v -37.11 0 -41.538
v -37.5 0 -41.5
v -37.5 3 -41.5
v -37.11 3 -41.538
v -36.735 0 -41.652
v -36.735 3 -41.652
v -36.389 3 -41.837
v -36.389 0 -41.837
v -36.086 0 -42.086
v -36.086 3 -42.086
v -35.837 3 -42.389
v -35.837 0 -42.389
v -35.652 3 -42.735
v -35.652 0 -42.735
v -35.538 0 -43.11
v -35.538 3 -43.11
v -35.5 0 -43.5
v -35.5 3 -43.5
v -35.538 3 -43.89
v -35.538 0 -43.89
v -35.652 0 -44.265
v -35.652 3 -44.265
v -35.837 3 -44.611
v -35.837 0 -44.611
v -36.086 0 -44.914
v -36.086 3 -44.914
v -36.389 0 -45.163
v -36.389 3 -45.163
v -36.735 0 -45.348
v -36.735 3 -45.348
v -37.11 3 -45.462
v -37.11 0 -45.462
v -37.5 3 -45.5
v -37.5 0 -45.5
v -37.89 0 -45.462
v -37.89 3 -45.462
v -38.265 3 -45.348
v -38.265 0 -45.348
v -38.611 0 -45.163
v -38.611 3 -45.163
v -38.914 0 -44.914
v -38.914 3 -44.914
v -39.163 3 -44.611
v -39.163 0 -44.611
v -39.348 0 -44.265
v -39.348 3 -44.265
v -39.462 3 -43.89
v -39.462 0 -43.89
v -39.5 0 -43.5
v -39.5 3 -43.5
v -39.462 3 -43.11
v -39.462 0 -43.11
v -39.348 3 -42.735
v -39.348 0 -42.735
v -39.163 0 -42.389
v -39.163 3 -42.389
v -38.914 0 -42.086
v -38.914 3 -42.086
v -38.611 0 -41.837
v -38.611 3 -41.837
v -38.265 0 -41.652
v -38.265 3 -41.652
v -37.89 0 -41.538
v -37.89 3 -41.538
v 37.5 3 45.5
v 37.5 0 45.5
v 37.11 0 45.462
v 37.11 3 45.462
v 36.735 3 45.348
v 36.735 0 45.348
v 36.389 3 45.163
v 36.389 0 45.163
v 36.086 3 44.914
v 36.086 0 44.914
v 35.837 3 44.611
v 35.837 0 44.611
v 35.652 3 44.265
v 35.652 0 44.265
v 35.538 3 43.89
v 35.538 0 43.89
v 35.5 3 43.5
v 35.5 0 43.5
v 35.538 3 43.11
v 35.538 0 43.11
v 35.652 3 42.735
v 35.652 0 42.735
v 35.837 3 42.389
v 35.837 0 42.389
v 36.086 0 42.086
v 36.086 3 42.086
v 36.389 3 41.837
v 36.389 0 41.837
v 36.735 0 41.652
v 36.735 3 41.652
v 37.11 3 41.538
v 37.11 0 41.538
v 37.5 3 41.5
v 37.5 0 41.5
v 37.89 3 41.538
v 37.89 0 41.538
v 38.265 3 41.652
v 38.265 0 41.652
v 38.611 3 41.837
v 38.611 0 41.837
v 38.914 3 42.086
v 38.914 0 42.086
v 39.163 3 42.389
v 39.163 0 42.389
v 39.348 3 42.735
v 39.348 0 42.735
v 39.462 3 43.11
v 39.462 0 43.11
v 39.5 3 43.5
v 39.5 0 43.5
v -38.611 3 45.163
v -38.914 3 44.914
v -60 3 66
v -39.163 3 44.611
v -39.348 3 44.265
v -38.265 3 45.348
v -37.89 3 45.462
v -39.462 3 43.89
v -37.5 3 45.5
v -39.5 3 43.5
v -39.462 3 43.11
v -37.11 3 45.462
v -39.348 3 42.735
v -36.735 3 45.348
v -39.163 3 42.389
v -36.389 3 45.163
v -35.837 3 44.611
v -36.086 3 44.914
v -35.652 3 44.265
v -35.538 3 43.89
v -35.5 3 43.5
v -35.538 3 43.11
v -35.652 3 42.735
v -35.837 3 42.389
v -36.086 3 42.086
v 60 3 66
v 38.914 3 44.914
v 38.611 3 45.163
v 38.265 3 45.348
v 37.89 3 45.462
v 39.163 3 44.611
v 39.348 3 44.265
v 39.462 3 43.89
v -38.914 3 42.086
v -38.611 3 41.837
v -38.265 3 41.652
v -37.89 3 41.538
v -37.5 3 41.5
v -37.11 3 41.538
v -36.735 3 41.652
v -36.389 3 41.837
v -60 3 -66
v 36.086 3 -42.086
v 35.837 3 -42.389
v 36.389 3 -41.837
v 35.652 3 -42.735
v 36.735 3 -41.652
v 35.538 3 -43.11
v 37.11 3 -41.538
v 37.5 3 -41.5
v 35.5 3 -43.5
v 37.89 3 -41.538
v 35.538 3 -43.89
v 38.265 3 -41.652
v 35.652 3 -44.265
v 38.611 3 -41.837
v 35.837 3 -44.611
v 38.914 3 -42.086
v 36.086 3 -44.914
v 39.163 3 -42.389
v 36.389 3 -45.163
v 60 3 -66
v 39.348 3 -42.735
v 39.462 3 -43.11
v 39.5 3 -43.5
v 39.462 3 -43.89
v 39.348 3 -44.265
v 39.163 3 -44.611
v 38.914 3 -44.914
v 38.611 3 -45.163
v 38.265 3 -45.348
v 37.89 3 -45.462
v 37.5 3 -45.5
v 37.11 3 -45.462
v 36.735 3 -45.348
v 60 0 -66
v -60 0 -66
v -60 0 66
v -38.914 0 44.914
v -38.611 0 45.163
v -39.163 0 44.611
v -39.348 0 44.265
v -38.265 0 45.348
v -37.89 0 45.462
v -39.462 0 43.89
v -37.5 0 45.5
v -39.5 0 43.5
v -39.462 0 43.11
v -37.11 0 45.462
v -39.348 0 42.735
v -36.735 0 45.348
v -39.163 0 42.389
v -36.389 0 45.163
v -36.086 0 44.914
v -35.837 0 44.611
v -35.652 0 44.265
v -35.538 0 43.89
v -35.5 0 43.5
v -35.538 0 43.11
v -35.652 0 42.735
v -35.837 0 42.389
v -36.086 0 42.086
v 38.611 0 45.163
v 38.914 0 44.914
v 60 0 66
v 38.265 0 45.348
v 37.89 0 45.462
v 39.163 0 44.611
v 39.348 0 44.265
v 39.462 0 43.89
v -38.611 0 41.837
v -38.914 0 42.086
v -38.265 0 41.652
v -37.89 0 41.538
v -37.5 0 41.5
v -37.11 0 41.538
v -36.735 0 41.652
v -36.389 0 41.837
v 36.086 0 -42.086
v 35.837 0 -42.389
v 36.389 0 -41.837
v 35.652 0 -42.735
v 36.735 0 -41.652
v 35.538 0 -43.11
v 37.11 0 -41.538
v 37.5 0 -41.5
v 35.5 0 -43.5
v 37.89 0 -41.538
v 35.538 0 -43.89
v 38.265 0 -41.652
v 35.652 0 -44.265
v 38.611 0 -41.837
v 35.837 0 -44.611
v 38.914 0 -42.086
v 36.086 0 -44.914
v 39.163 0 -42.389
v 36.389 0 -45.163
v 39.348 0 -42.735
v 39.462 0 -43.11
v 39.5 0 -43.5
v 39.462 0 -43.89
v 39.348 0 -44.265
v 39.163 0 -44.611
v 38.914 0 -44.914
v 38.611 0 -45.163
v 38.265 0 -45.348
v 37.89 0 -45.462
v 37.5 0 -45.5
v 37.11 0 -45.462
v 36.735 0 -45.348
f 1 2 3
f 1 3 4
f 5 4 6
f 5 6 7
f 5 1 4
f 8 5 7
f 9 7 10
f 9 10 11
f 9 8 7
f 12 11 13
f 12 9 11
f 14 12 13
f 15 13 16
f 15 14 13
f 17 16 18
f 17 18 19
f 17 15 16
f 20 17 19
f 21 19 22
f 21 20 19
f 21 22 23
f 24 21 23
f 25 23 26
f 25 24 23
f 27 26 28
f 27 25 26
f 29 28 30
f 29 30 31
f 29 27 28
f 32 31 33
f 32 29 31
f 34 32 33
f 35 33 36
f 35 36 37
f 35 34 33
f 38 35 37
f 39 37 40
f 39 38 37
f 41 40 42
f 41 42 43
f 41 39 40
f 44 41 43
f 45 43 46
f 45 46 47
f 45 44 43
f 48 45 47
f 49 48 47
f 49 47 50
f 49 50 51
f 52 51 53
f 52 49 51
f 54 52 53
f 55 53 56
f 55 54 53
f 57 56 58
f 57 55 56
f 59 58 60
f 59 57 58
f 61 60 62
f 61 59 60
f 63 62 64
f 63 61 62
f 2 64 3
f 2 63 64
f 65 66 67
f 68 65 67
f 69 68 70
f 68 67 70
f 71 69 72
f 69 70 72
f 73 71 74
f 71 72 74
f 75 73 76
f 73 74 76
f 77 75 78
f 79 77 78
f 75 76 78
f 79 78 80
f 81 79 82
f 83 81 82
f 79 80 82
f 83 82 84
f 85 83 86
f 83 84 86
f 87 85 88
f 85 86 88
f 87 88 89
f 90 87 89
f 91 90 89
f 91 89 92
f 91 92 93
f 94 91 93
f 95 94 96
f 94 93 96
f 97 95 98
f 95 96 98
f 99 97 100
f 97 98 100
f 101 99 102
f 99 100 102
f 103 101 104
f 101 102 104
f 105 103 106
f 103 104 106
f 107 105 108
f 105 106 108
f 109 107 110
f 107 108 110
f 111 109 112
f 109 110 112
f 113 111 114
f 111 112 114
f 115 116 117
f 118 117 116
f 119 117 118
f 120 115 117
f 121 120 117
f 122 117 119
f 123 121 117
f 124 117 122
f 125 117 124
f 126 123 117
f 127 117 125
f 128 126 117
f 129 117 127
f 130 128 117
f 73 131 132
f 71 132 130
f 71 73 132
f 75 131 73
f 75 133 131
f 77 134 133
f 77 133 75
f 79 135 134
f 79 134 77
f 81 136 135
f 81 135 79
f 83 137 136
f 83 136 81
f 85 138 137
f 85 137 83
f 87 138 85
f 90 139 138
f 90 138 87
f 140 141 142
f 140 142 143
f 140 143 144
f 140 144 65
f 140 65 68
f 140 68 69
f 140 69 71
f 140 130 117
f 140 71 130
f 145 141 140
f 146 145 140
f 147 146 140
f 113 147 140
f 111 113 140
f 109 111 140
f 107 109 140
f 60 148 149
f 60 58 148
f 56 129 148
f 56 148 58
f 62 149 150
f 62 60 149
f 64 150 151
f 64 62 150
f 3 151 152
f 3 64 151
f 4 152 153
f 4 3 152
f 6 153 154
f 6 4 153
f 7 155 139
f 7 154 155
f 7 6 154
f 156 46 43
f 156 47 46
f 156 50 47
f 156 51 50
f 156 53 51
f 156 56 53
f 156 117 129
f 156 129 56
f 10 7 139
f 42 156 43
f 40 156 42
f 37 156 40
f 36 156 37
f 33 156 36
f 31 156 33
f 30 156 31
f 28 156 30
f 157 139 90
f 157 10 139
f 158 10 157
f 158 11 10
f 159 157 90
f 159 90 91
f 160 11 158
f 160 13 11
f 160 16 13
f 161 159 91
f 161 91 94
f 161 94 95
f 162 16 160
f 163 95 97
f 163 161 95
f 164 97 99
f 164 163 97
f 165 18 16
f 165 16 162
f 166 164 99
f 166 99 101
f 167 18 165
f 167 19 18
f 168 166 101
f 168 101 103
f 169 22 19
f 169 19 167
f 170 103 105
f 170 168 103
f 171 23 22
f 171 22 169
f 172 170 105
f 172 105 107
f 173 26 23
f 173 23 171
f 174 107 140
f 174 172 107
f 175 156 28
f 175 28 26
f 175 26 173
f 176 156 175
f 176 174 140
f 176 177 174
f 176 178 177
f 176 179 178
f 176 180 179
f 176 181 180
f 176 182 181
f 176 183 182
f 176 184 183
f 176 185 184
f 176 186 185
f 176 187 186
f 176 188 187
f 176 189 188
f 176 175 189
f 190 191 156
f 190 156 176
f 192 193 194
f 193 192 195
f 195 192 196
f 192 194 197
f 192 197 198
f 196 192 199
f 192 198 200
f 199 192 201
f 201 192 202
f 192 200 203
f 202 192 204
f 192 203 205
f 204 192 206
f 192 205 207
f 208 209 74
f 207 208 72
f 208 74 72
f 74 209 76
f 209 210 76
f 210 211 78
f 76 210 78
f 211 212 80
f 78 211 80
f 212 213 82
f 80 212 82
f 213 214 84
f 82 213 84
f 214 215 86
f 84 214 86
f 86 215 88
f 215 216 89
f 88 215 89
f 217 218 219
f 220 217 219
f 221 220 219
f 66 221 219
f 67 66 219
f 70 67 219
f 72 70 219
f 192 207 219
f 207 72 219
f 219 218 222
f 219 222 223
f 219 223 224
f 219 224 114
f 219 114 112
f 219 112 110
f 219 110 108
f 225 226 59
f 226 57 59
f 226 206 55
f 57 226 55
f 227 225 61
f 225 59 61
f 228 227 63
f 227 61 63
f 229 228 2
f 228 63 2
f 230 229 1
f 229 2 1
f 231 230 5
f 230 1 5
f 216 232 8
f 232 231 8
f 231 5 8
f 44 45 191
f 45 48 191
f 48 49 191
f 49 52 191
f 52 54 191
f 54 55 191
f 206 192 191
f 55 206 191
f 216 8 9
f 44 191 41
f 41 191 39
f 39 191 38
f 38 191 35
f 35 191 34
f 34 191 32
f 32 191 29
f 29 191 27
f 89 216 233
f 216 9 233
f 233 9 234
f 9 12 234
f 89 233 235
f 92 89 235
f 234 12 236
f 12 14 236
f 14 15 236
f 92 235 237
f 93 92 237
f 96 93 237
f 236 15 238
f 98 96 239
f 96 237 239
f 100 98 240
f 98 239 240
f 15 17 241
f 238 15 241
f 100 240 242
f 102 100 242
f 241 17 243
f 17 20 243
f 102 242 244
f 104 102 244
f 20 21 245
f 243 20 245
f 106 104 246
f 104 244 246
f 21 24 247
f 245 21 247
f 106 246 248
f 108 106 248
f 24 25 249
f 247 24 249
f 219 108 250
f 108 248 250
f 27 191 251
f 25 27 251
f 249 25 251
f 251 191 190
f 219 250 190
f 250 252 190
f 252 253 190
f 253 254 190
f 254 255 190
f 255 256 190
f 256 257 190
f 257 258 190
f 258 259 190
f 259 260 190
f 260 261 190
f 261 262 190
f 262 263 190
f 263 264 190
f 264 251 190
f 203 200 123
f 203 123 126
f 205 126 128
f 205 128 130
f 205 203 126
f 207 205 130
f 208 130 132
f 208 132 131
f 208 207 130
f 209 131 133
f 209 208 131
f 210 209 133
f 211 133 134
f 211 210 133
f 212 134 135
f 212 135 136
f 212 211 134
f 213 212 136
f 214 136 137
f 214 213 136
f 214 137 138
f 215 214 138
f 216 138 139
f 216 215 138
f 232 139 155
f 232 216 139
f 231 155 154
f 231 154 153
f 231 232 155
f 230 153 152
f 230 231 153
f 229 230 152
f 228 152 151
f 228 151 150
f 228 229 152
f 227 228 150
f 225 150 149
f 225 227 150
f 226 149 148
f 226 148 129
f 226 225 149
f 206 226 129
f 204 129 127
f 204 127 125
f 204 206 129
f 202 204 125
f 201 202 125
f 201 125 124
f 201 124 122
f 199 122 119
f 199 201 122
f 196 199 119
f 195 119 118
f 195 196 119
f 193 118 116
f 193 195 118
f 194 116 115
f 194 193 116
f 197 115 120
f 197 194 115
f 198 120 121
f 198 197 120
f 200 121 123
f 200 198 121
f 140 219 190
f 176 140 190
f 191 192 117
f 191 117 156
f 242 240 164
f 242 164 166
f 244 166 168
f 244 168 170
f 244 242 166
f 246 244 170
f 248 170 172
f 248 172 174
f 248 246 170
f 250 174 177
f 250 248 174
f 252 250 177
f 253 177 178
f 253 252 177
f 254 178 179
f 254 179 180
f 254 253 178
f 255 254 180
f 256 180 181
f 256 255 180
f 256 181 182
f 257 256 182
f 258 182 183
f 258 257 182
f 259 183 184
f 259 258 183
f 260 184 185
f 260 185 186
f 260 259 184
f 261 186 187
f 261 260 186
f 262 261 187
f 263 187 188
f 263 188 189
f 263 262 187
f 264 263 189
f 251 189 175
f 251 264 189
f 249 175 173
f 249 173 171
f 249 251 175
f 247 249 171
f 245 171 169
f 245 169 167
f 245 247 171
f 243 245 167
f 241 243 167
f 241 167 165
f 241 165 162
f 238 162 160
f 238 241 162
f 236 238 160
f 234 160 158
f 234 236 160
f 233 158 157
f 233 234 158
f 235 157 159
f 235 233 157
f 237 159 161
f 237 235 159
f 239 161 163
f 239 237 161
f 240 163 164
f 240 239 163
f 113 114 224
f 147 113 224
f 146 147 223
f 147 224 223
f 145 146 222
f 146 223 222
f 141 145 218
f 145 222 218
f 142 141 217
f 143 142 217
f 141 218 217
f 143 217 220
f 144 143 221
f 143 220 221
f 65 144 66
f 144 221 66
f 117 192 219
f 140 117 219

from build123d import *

# Parameters (mm, degrees)
SKETCH2_W           = 120
SKETCH2_H           = 132
SKETCH2_W_2         = 95
SKETCH2_H_2         = 107
SKETCH2_R           = 2
BOSS_EXTRUDE1_DEPTH = 3


with BuildPart() as part:
    # Sketch2 → Boss-Extrude1 (new body)
    # profile 1 of 3: a face of its own
    with BuildSketch(Plane(origin=(0, 0, 0), x_dir=(1, 0, 0), z_dir=(0, 1, 0))):
        Rectangle(SKETCH2_W, SKETCH2_H)
        Rectangle(SKETCH2_W_2, SKETCH2_H_2, mode=Mode.SUBTRACT)
    # profile 2 of 3: a face of its own
    with BuildSketch(Plane(origin=(0, 0, 0), x_dir=(1, 0, 0), z_dir=(0, 1, 0))):
        with BuildLine():
            ThreePointArc((37.5, -45.5), (36.085786438, -42.085786438), (39.5, -43.5))
            Line((39.5, -43.5), (47.5, -43.5))
            Line((47.5, -43.5), (47.5, 53.5))
            Line((47.5, 53.5), (-47.5, 53.5))
            Line((-47.5, 53.5), (-47.5, -53.5))
            Line((-47.5, -53.5), (37.5, -53.5))
            Line((37.5, -53.5), (37.5, -45.5))
        make_face()
        with Locations(Location((-37.5, -43.5, 0), (0, 0, 270))):
            Circle(SKETCH2_R, mode=Mode.SUBTRACT)
        with Locations(Location((-37.5, 43.5, 0), (0, 0, 270))):
            Circle(SKETCH2_R, mode=Mode.SUBTRACT)
        with Locations(Location((37.5, 43.5, 0), (0, 0, 270))):
            Circle(SKETCH2_R, mode=Mode.SUBTRACT)
    # profile 3 of 3: a face of its own
    with BuildSketch(Plane(origin=(0, 0, 0), x_dir=(1, 0, 0), z_dir=(0, 1, 0))):
        with BuildLine():
            Line((47.5, -43.5), (39.5, -43.5))
            ThreePointArc((39.5, -43.5), (38.914213562, -44.914213562), (37.5, -45.5))
            Line((37.5, -45.5), (37.5, -53.5))
            Line((37.5, -53.5), (47.5, -53.5))
            Line((47.5, -53.5), (47.5, -43.5))
        make_face()
    extrude(amount=BOSS_EXTRUDE1_DEPTH)


solid = part.part
